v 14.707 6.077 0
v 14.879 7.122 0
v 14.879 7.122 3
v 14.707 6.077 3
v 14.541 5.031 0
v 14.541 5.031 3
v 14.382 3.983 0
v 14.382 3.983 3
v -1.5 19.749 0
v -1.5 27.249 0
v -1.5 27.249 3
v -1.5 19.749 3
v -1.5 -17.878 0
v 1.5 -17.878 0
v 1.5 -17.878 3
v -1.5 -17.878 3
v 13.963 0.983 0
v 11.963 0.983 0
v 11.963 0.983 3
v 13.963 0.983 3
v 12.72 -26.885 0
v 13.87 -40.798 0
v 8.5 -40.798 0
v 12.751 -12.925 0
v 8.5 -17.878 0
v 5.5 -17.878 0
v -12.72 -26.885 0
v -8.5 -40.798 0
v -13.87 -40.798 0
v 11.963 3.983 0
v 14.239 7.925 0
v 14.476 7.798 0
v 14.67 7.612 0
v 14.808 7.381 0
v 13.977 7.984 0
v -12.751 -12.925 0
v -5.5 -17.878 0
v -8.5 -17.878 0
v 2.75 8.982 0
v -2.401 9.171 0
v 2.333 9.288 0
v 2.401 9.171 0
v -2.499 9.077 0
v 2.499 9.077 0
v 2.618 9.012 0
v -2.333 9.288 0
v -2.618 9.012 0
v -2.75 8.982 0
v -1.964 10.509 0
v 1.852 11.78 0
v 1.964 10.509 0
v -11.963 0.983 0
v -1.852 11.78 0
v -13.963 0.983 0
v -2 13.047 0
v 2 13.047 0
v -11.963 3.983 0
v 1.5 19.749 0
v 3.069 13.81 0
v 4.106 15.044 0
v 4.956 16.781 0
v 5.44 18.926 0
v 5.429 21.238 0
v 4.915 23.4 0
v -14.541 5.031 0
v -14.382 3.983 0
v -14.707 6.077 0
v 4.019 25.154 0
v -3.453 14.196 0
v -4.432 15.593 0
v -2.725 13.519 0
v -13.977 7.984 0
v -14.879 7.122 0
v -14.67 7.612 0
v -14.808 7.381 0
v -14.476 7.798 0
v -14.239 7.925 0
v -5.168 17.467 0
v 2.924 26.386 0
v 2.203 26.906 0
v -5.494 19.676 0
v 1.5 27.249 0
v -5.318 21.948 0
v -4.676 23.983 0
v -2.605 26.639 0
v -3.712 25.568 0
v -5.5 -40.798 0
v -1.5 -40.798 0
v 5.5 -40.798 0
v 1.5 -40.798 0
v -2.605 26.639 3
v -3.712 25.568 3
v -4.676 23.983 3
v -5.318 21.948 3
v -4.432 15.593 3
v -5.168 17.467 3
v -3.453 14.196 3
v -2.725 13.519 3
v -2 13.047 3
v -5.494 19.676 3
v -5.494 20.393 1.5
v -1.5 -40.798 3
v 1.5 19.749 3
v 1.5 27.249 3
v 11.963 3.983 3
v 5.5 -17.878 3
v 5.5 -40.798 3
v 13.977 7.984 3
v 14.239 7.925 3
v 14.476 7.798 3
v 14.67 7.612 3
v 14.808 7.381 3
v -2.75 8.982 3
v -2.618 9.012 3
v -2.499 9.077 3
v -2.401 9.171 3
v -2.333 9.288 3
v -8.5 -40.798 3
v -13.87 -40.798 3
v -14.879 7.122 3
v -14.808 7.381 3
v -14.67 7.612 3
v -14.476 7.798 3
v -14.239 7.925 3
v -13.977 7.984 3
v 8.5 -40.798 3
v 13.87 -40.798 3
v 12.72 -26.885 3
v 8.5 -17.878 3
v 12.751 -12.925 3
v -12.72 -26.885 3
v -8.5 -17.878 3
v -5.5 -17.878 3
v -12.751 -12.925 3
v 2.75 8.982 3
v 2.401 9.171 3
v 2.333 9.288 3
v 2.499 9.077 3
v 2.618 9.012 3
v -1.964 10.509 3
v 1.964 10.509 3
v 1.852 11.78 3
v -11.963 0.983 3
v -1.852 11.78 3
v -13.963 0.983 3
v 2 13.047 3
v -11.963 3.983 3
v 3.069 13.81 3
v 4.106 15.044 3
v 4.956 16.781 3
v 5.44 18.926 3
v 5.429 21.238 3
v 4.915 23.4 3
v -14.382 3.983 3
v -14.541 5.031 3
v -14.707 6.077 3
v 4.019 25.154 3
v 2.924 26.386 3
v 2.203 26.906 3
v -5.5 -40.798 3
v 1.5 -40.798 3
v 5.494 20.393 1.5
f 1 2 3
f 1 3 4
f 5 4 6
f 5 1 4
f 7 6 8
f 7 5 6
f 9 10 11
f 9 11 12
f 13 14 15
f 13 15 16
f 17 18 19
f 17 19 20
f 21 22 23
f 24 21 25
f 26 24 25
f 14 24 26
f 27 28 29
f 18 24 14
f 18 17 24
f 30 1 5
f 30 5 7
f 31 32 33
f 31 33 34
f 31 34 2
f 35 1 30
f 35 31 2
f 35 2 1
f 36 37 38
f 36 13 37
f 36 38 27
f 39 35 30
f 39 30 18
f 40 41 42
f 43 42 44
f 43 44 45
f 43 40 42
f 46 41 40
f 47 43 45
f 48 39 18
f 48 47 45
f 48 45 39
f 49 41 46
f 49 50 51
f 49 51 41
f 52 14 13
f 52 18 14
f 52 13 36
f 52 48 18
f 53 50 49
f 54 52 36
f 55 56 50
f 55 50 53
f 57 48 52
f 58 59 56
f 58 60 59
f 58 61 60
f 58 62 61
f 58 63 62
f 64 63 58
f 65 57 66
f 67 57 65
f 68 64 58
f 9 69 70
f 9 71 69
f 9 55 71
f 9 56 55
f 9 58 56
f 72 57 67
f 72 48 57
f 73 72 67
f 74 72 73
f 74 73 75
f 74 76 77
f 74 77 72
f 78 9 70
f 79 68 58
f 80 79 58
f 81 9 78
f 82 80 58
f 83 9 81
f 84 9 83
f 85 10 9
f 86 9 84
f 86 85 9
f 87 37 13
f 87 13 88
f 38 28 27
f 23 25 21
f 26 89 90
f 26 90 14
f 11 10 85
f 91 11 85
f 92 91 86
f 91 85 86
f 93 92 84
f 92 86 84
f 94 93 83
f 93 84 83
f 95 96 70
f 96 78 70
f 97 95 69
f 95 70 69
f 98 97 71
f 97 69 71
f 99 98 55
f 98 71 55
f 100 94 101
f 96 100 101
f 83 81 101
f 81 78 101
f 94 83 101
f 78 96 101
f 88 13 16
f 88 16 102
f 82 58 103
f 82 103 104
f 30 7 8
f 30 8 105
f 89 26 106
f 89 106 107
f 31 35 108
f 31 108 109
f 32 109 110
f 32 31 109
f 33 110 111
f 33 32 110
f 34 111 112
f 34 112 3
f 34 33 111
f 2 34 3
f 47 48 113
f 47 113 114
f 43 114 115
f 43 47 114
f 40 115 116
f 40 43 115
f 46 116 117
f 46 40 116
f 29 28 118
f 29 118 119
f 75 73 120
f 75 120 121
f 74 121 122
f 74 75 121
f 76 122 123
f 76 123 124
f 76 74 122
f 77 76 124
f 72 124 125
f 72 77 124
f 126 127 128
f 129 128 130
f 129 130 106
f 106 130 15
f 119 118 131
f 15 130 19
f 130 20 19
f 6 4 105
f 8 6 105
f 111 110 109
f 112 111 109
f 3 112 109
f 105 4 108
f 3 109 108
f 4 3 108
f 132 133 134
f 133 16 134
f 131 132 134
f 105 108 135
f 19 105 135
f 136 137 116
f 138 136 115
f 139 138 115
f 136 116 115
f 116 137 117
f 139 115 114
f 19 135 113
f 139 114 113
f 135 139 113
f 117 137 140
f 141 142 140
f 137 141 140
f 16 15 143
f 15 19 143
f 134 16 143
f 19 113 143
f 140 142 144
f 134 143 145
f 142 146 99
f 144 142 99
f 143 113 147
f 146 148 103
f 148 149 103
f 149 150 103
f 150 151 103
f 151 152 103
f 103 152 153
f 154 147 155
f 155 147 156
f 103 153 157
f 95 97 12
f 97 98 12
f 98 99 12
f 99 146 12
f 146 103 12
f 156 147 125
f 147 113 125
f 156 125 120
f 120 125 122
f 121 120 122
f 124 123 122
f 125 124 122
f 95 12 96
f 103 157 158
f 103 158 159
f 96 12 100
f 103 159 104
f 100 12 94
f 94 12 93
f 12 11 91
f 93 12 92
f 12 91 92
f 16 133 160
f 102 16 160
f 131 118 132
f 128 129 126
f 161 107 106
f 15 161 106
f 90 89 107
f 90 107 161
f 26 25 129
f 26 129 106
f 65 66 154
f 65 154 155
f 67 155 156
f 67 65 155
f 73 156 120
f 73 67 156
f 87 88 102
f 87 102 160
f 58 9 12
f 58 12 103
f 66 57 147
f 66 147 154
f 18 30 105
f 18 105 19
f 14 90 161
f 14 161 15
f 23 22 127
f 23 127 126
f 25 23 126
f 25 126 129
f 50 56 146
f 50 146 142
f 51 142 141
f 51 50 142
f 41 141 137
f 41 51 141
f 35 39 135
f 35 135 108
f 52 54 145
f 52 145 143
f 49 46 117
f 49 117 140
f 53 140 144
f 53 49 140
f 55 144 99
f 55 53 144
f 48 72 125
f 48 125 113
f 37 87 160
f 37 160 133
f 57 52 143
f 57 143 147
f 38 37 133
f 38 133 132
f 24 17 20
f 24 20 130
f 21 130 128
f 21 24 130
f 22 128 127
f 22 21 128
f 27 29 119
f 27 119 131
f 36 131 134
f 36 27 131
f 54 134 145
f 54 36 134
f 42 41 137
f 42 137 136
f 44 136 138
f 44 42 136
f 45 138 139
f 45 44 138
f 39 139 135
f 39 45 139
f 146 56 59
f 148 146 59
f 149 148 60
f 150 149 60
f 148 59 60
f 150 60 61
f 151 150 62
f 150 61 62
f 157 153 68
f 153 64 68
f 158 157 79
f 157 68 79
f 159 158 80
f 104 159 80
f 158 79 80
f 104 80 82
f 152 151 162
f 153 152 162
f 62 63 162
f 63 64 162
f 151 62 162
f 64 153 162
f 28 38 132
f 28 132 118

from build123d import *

# Parameters (mm, degrees)
BOSS_EXTRUDE3_DEPTH = 3


with BuildPart() as part:
    # Sketch3 → Boss-Extrude3 (new body)
    with BuildSketch(Plane.XY):
        with BuildLine():
            Line((1.5, -40.798266812), (1.5, -17.877938214))
            Line((1.5, -17.877938214), (-1.5, -17.877938214))
            Line((-1.5, -17.877938214), (-1.5, -40.798266812))
            Line((-1.5, -40.798266812), (-5.5, -40.798266812))
            Line((-5.5, -40.798266812), (-5.5, -17.877938214))
            Line((-5.5, -17.877938214), (-8.5, -17.877938214))
            Line((-8.5, -17.877938214), (-8.5, -40.798266812))
            Line((-8.5, -40.798266812), (-13.869579038, -40.798266812))
            ThreePointArc((-13.869579038, -40.798266812), (-12.587739972, -19.904581661), (-13.963477054, 0.983130949))
            Line((-13.963477054, 0.983130949), (-11.963477054, 0.983130949))
            Line((-11.963477054, 0.983130949), (-11.963477054, 3.983130949))
            Line((-11.963477054, 3.983130949), (-14.381577939, 3.983130949))
            ThreePointArc((-14.381577939, 3.983130949), (-14.622945439, 5.553795951), (-14.879439279, 7.122061786))
            ThreePointArc((-14.879439279, 7.122061786), (-14.579260447, 7.711309245), (-13.976966099, 7.984368613))
            Line((-13.976966099, 7.984368613), (-2.75, 8.982321155))
            ThreePointArc((-2.75, 8.982321155), (-2.498879462, 9.076941447), (-2.33284853, 9.287768993))
            ThreePointArc((-2.33284853, 9.287768993), (-1.875511855, 11.141722585), (-2, 13.047189315))
            add(Edge.make_bspline(
                [(-1.5, 27.249432049), (-17.245966692, 21.162756592), (-2, 13.047189315)],
                knots=[3.417819284, 3.417819284, 3.417819284, 5.911016773, 5.911016773, 5.911016773], degree=2, weights=[1, 0.318548271, 1]))
            Line((-1.5, 27.249432049), (-1.5, 19.749432049))
            Line((-1.5, 19.749432049), (1.5, 19.749432049))
            Line((1.5, 19.749432049), (1.5, 27.249432049))
            add(Edge.make_bspline(
                [(2, 13.047189315), (17.245966692, 21.162756592), (1.5, 27.249432049)],
                knots=[0.372168534, 0.372168534, 0.372168534, 2.865366023, 2.865366023, 2.865366023], degree=2, weights=[1, 0.318548271, 1]))
            ThreePointArc((2, 13.047189315), (1.875511855, 11.141722585), (2.33284853, 9.287768993))
            ThreePointArc((2.33284853, 9.287768993), (2.498879462, 9.076941447), (2.75, 8.982321155))
            Line((2.75, 8.982321155), (13.976966099, 7.984368613))
            ThreePointArc((13.976966099, 7.984368613), (14.579260447, 7.711309245), (14.879439279, 7.122061786))
            ThreePointArc((14.879439279, 7.122061786), (14.622945439, 5.553795951), (14.381577939, 3.983130949))
            Line((14.381577939, 3.983130949), (11.963477054, 3.983130949))
            Line((11.963477054, 3.983130949), (11.963477054, 0.983130949))
            Line((11.963477054, 0.983130949), (13.963477054, 0.983130949))
            ThreePointArc((13.963477054, 0.983130949), (12.587739972, -19.904581661), (13.869579038, -40.798266812))
            Line((13.869579038, -40.798266812), (8.5, -40.798266812))
            Line((8.5, -40.798266812), (8.5, -17.877938214))
            Line((8.5, -17.877938214), (5.5, -17.877938214))
            Line((5.5, -17.877938214), (5.5, -40.798266812))
            Line((5.5, -40.798266812), (1.5, -40.798266812))
        make_face()
    extrude(amount=BOSS_EXTRUDE3_DEPTH)


solid = part.part
